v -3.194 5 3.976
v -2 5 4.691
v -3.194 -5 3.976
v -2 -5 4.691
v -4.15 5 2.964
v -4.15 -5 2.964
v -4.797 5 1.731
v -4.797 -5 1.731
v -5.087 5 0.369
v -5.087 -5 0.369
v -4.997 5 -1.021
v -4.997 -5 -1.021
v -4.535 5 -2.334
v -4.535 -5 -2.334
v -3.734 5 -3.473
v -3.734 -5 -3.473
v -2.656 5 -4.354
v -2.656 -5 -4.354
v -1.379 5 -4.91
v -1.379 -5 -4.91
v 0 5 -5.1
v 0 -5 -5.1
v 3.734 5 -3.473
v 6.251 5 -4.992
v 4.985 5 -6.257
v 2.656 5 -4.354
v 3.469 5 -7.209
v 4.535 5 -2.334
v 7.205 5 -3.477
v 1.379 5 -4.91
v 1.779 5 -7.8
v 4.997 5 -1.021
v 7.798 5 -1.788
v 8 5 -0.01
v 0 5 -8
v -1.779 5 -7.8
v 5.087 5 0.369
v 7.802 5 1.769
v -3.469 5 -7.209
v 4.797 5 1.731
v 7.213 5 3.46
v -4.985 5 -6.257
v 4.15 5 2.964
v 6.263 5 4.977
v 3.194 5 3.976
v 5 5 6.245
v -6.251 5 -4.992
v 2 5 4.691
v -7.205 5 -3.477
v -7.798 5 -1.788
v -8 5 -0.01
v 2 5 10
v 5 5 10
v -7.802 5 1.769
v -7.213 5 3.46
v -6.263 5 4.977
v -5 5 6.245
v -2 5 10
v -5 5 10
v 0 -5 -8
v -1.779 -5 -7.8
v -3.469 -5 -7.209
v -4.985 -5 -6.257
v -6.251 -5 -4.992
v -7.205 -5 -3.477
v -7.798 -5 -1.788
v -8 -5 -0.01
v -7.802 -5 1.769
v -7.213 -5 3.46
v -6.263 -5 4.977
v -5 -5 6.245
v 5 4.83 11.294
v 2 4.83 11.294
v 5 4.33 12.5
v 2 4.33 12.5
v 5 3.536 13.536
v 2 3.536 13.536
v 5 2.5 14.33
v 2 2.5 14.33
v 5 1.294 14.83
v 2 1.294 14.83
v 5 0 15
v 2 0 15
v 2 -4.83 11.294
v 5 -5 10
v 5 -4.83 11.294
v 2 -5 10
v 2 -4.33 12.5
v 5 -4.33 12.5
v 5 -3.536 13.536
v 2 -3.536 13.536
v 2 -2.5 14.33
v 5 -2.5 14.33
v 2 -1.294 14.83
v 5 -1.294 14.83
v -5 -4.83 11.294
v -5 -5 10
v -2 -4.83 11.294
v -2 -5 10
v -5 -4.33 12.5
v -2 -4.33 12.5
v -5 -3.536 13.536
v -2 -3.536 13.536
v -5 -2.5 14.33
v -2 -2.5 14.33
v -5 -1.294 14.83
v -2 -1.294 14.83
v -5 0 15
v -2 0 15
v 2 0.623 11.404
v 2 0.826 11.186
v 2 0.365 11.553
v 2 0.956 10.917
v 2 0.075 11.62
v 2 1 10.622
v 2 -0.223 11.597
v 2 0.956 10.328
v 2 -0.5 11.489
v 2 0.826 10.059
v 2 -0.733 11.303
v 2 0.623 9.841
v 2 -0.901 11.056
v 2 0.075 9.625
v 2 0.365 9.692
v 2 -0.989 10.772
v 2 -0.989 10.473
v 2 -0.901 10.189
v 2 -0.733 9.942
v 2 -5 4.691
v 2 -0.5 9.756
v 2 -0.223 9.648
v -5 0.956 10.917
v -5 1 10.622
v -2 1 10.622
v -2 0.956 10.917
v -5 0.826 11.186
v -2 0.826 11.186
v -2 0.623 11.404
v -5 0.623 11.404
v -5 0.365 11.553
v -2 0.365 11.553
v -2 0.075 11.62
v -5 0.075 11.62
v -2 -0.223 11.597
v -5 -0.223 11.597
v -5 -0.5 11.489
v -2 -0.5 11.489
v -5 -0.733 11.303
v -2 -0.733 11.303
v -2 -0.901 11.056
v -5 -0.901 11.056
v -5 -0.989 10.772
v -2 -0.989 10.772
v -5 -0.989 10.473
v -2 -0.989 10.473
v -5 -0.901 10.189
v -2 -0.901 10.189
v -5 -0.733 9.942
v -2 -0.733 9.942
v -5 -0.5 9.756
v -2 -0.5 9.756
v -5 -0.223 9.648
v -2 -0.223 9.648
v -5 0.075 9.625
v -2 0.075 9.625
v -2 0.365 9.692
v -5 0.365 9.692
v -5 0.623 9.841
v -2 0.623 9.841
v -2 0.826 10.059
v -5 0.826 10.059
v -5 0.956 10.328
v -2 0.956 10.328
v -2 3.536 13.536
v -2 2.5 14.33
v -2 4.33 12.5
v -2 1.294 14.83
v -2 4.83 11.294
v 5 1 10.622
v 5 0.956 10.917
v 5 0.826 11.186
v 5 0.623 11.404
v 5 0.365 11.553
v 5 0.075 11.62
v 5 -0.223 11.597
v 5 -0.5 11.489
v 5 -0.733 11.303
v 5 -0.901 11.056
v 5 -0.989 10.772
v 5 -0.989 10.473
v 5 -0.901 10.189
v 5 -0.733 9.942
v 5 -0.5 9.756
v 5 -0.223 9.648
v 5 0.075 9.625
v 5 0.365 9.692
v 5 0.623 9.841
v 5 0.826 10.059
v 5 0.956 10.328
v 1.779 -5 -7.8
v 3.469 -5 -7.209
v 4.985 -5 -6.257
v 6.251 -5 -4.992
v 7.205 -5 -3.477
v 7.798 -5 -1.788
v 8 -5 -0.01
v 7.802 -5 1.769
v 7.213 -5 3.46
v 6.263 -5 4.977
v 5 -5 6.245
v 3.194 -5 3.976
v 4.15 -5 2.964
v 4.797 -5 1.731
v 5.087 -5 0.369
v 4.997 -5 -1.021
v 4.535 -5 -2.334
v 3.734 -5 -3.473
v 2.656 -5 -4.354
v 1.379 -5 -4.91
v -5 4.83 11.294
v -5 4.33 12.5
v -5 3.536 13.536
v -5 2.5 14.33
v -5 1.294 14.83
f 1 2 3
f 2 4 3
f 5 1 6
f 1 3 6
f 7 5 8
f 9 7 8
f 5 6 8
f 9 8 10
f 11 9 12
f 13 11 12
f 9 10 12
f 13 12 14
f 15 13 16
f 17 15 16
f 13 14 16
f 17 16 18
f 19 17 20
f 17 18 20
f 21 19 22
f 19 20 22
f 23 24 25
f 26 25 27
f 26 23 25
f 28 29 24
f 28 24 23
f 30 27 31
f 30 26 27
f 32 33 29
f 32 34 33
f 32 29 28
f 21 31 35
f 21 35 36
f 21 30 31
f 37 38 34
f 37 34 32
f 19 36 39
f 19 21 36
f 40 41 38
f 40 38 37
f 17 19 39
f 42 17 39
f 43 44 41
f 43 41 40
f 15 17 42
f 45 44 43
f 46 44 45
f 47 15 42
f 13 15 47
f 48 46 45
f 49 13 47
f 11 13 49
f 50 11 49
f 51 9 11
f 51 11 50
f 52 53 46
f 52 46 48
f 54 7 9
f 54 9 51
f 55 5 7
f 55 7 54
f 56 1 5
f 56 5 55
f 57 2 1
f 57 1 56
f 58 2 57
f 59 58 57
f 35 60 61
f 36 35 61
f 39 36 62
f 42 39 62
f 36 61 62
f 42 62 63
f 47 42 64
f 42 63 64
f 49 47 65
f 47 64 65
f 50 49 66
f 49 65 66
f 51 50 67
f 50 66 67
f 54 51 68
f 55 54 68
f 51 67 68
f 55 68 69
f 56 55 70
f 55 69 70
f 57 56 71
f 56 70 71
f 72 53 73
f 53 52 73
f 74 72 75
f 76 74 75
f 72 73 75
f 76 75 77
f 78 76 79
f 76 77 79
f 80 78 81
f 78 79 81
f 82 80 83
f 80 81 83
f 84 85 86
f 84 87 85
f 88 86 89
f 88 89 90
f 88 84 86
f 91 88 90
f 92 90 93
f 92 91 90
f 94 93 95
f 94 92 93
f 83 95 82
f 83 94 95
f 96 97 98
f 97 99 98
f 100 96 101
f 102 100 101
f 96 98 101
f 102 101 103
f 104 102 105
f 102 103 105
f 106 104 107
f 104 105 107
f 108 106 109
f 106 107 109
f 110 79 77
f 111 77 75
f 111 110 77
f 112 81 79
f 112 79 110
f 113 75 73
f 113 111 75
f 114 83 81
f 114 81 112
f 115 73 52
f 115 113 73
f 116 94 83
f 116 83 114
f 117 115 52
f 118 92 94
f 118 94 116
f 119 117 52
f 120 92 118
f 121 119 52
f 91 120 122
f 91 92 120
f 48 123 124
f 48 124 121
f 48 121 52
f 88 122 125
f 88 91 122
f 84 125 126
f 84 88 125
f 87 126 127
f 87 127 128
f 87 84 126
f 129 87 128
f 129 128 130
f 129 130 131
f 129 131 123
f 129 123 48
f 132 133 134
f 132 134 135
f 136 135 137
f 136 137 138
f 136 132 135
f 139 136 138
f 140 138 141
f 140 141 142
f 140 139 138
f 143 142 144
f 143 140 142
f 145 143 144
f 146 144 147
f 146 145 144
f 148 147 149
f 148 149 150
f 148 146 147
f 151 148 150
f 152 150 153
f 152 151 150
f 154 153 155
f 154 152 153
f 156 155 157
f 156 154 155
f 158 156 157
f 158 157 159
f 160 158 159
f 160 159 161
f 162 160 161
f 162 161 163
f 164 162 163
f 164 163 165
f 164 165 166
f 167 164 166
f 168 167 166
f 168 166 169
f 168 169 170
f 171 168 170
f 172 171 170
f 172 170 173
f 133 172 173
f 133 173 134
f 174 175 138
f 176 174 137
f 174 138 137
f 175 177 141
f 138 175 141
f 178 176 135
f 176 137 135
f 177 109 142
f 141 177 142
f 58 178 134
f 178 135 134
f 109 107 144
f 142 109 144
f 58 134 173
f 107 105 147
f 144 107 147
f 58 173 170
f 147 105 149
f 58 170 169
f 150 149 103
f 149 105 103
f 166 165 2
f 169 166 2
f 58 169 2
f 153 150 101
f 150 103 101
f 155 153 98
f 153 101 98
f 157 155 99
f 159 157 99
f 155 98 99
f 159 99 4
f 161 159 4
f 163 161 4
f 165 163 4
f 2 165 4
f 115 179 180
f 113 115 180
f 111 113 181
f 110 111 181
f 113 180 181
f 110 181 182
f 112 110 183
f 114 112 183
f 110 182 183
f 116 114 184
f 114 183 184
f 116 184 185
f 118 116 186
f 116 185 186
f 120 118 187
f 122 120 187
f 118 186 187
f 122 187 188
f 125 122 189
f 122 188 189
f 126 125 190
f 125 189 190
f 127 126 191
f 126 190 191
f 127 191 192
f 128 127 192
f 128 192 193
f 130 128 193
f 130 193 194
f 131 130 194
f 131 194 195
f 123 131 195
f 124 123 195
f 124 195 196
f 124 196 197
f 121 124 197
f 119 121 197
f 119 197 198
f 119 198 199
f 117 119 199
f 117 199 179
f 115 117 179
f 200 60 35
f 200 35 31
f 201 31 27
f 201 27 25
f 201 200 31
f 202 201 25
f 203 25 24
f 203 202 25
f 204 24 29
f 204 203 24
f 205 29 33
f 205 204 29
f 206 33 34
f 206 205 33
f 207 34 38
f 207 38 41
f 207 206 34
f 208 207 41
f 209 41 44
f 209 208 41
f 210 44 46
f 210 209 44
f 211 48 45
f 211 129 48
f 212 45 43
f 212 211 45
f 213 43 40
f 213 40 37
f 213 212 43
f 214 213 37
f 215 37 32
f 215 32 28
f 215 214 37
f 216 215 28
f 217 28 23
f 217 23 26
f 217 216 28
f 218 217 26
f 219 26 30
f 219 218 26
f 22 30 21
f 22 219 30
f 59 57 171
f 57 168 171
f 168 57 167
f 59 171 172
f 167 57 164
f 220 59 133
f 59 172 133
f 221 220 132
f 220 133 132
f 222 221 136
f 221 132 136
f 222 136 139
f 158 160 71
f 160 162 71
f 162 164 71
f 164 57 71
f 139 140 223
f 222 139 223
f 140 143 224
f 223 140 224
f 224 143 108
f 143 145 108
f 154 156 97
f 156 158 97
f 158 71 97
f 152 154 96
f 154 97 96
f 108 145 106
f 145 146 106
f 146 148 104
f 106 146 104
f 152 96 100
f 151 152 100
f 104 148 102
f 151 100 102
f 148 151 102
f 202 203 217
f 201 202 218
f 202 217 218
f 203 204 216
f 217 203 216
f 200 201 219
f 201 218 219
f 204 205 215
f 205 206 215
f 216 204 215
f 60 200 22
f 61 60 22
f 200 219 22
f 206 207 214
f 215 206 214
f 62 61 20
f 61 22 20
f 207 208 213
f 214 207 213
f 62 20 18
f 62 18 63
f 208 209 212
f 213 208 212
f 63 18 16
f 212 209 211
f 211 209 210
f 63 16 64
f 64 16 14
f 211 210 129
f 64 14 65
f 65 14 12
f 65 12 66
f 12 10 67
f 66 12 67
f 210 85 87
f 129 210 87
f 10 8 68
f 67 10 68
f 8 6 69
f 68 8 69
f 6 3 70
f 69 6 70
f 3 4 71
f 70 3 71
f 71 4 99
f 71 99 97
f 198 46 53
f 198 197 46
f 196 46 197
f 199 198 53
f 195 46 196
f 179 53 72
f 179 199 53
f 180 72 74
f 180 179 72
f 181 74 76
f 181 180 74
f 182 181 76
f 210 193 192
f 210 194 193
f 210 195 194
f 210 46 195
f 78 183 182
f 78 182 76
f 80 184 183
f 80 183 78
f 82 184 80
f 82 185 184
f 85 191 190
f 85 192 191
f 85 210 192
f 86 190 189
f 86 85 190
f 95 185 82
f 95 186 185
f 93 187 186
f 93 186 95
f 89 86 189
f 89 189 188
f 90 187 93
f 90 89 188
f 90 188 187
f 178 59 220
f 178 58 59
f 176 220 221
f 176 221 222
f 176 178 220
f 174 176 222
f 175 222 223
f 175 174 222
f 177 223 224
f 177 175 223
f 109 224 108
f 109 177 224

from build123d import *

# Parameters (mm, degrees)
F1_DEPTH = 5
F2_R     = 1
F3_DEPTH = 25
F4_R     = 4.99999


# Not quite as in the source:
# - a fillet or chamfer is up to 0.001 mm smaller than in the source, because OpenCascade refuses the exact size
# - a feature names something its author has since deleted; it is built from what else it names


with BuildPart() as f1:
    # F0 (on Front) → F1 (new body, symmetric)
    with BuildSketch(Plane.XZ):
        with BuildLine():
            ThreePointArc((2, 4.6914816423), (4.9968268119, -1.0206477415), (0, -5.1))
            Line((0, -5.1), (0, -8))
            ThreePointArc((0, -8), (7.5485092564, -2.6495297708), (5, 6.2449979984))
            ThreePointArc((5, 6.2449979984), (3.5795567819, 7.1544932207), (2, 7.7459666924))
            Line((2, 7.7459666924), (2, 4.6914816423))
        make_face()
        with BuildLine():
            Line((2, 15), (2, 7.7459666924))
            ThreePointArc((2, 7.7459666924), (3.5795567819, 7.1544932207), (5, 6.2449979984))
            Line((5, 6.2449979984), (5, 15))
            Line((5, 15), (2, 15))
        make_face()
    extrude(amount=F1_DEPTH, both=True)

    # F2 (on face) → F3 (cut)
    with BuildSketch(Plane.YZ.offset(5)):
        with Locations((0, 10.6224989992)):
            Circle(F2_R)
    extrude(amount=-F3_DEPTH, mode=Mode.SUBTRACT)

    # F4 (radius 5 in the source; OpenCascade refuses exactly that, so slightly less here)
    f4_edges = [f1.edges().sort_by_distance(p)[0] for p in [
        (3.5, -5, 15),
        (3.5, 5, 15),
    ]]
    fillet(f4_edges, radius=F4_R)

    # F5: F1 across plane


with BuildPart() as f1_1:
    add(f1.part)
    add(f1.part.mirror(Plane.YZ))


solid = f1_1.part
